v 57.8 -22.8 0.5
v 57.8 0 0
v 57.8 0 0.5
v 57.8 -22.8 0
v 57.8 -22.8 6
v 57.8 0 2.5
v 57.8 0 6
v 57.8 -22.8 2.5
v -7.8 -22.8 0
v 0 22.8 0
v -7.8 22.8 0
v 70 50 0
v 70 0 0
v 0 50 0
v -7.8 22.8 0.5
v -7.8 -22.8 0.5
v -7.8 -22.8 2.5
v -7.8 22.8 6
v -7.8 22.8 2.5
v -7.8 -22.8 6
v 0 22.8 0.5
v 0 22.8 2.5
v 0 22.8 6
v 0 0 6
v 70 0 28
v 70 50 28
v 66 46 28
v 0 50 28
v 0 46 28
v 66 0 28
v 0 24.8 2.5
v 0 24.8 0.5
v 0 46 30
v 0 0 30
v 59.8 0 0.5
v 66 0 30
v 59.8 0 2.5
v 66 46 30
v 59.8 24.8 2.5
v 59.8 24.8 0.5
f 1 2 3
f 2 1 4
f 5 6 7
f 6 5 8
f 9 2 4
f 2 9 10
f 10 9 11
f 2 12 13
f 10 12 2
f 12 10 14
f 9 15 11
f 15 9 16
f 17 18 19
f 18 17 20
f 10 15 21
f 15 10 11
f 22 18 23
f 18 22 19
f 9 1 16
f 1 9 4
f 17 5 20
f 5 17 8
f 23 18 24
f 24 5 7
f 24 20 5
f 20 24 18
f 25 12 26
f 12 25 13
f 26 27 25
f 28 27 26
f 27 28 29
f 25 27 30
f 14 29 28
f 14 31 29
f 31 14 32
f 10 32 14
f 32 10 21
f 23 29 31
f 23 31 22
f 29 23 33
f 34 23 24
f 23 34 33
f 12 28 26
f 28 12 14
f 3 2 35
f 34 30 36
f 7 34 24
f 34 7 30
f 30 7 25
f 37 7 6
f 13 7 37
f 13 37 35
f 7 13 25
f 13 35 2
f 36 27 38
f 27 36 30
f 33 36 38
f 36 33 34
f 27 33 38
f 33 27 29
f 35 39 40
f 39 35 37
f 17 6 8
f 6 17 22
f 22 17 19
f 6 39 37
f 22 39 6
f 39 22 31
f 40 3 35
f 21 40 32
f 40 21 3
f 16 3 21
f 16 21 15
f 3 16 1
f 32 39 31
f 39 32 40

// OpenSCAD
// Two-part enclosure for a small electronics board (e.g. Arduino-based temperature logger)
// Print orientation: box standing on the bed, lid printed upside down on the +X side

// ---------- Parameters ----------
box_x      = 70;    // box outer size in X
box_y      = 50;    // box outer size in Y
box_z      = 30;    // box outer size in Z
box_wall   = 2;     // box wall thickness
box_floor  = 2;     // box floor thickness

gap        = 10;    // gap between box and lid

lip_x      = 65.6;  // lip outer size in X
lip_y      = 45.6;  // lip outer size in Y
lip_h      = 4;     // lip height above plate
lip_wall   = 1.5;   // lip wall thickness

eps        = 0.5;   // cutter overshoot

$fn = 64;

// ---------- Derived ----------
box_inner_x = box_x - 2*box_wall;
box_inner_y = box_y - 2*box_wall;
plate_t     = 2;    // plate thickness

// ---------- Model ----------
difference() {
    union() {
        // Box (open top)
        cube([box_x, box_y, box_z - box_floor]);
        translate([0, 0, box_z - box_floor])
            cube([box_inner_x, box_inner_y, box_wall]);

        // Lid: plate with centred lip
        union() {
            translate([box_x/2 - gap - lip_x/2, -lip_y/2, 0])
                cube([lip_x, lip_y, plate_t]);
            translate([box_x/2 - gap - lip_x/2, -lip_y/2, plate_t])
                cube([lip_x, lip_y, lip_h]);
        }
    }

    // Lip cutter, sunk into the plate so the wall is exactly lip_wall thick
    translate([box_x/2 - gap - lip_x/2 - box_wall, -lip_y/2 - box_wall, plate_t - lip_wall])
        cube([lip_x + 2*box_wall, lip_y + 2*box_wall, lip_wall + eps]);
}
